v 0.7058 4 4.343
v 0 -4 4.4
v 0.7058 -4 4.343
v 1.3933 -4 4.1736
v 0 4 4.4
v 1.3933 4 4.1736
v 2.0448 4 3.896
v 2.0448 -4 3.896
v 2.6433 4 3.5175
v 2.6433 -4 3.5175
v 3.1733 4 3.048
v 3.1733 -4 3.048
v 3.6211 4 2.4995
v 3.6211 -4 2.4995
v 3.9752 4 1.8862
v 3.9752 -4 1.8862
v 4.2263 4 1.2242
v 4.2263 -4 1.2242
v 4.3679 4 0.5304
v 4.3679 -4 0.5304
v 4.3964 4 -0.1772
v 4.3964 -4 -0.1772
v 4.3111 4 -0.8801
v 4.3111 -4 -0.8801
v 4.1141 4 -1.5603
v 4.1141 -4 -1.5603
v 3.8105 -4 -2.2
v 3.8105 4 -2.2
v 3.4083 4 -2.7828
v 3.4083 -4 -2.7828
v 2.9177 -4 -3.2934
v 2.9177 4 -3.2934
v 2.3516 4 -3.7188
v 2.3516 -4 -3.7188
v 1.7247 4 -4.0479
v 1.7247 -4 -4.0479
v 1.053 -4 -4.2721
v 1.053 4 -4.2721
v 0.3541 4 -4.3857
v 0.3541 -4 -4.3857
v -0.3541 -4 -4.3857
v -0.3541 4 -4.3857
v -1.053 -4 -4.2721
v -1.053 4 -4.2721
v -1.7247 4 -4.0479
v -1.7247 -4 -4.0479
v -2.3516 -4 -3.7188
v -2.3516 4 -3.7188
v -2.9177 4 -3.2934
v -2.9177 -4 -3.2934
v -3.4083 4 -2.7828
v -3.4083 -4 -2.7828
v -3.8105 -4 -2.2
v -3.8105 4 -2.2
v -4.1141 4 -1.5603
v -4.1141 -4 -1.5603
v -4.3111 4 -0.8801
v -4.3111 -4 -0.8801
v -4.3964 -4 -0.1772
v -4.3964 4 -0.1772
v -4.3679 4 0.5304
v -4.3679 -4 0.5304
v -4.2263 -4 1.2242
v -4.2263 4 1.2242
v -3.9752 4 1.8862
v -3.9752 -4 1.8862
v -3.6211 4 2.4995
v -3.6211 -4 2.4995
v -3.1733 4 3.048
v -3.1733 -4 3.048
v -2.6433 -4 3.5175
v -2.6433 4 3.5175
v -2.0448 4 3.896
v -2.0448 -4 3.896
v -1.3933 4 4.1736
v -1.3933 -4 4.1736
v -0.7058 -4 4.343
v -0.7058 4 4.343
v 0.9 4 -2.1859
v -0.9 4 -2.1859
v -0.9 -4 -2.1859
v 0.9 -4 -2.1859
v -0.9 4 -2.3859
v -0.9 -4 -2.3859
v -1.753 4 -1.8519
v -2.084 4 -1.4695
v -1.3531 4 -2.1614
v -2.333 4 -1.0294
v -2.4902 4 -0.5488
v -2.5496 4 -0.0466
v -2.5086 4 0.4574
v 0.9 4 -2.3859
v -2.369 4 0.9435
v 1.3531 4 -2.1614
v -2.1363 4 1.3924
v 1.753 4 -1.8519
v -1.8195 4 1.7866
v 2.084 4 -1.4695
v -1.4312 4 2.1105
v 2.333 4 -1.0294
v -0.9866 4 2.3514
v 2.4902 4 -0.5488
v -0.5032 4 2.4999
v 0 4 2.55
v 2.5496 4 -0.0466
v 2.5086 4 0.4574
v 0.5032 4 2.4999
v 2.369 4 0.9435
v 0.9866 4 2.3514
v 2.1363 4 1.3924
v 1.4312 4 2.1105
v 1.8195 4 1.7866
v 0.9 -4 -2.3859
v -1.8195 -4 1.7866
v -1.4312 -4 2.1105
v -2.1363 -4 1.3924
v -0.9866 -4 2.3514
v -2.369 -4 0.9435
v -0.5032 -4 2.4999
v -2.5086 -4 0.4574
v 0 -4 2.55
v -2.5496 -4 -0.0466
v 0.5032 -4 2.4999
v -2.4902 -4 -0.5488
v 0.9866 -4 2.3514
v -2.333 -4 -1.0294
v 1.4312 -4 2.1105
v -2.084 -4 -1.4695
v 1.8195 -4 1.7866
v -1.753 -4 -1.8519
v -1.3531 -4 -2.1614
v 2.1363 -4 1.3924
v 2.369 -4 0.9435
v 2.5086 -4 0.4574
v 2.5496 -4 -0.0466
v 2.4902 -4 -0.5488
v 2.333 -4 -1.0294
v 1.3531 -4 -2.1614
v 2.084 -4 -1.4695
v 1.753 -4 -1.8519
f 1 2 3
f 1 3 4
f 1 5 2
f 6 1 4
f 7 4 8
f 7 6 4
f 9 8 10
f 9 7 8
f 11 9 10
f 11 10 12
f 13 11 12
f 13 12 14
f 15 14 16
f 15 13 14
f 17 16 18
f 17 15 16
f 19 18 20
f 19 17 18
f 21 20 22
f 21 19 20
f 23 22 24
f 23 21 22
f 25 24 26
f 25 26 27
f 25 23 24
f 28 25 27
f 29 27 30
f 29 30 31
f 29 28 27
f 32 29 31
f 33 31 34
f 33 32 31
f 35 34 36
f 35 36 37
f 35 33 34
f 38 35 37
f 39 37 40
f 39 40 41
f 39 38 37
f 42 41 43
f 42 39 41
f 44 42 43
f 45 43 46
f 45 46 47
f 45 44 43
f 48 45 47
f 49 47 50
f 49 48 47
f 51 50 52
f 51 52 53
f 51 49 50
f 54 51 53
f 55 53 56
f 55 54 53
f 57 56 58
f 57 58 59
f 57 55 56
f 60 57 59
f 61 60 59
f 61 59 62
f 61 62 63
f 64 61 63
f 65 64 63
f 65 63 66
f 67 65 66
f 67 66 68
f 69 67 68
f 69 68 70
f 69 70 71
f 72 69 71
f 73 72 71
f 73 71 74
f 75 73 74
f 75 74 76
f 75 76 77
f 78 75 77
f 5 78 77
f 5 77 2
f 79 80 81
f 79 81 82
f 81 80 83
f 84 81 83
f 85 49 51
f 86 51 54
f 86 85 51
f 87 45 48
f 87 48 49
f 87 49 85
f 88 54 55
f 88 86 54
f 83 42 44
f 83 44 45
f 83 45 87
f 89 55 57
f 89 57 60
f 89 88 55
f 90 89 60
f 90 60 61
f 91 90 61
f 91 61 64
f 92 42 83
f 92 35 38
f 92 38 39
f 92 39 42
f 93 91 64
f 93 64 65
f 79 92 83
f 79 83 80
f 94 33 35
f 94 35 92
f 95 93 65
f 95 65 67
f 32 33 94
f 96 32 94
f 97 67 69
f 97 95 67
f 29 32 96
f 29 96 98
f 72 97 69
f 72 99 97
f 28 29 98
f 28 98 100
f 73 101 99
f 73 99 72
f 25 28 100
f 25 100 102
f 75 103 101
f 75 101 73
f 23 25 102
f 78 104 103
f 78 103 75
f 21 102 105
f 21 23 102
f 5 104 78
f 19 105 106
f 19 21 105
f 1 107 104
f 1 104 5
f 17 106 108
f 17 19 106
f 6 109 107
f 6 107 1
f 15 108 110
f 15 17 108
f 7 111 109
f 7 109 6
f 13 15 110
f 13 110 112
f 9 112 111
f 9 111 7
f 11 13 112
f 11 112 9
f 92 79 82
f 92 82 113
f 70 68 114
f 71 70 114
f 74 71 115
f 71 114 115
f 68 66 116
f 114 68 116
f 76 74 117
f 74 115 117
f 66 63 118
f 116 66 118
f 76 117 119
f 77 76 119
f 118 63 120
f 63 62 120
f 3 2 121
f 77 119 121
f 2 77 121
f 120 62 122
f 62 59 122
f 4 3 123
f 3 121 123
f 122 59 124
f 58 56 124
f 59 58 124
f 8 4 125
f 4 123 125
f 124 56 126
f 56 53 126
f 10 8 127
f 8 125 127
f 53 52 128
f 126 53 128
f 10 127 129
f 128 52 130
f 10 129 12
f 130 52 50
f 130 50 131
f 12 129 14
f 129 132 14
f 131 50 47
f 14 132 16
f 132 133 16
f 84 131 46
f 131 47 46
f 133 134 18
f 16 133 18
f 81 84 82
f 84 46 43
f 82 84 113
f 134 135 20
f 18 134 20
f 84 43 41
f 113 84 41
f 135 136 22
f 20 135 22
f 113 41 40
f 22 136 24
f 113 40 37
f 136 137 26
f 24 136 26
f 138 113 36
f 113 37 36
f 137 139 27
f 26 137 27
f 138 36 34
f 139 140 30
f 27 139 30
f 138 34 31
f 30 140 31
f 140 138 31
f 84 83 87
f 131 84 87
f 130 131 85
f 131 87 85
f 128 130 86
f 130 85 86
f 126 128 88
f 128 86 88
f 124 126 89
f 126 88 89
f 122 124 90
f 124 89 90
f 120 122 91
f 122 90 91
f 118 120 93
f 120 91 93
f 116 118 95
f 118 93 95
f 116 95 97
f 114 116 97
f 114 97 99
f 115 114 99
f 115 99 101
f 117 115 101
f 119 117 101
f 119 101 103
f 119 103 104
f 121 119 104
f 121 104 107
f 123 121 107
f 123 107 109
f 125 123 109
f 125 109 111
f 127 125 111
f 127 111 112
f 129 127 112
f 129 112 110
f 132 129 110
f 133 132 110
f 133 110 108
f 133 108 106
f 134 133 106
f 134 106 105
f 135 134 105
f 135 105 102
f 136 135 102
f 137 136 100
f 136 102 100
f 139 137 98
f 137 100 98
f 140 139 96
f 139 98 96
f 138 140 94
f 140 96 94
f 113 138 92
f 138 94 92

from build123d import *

# Parameters (mm, degrees)
SKETCH1_R           = 4.4
SKETCH1_R_2         = 2.55
SKETCH1_W           = 1.8
SKETCH1_H           = 0.2
BOSS_EXTRUDE1_DEPTH = 4


with BuildPart() as part:
    # Sketch1 → Boss-Extrude1 (new, symmetric)
    # profile 1 of 3: a face of its own
    with BuildSketch(Plane(origin=(0, 0, 0), x_dir=(1, 0, 0), z_dir=(0, 1, 0))):
        with Locations(Location((0, 0, 0), (0, 0, 270))):
            Circle(SKETCH1_R)
        Circle(SKETCH1_R_2, mode=Mode.SUBTRACT)
    # profile 2 of 3: a face of its own
    with BuildSketch(Plane(origin=(0, 0, 0), x_dir=(1, 0, 0), z_dir=(0, 1, 0))):
        with Locations((0, 2.285896058)):
            Rectangle(SKETCH1_W, SKETCH1_H)
    # profile 3 of 3: a face of its own
    with BuildSketch(Plane(origin=(0, 0, 0), x_dir=(1, 0, 0), z_dir=(0, 1, 0))):
        with BuildLine():
            ThreePointArc((0.9, 2.385896058), (0, 2.55), (-0.9, 2.385896058))
            Line((-0.9, 2.385896058), (0.9, 2.385896058))
        make_face()
    extrude(amount=BOSS_EXTRUDE1_DEPTH, both=True)


solid = part.part
